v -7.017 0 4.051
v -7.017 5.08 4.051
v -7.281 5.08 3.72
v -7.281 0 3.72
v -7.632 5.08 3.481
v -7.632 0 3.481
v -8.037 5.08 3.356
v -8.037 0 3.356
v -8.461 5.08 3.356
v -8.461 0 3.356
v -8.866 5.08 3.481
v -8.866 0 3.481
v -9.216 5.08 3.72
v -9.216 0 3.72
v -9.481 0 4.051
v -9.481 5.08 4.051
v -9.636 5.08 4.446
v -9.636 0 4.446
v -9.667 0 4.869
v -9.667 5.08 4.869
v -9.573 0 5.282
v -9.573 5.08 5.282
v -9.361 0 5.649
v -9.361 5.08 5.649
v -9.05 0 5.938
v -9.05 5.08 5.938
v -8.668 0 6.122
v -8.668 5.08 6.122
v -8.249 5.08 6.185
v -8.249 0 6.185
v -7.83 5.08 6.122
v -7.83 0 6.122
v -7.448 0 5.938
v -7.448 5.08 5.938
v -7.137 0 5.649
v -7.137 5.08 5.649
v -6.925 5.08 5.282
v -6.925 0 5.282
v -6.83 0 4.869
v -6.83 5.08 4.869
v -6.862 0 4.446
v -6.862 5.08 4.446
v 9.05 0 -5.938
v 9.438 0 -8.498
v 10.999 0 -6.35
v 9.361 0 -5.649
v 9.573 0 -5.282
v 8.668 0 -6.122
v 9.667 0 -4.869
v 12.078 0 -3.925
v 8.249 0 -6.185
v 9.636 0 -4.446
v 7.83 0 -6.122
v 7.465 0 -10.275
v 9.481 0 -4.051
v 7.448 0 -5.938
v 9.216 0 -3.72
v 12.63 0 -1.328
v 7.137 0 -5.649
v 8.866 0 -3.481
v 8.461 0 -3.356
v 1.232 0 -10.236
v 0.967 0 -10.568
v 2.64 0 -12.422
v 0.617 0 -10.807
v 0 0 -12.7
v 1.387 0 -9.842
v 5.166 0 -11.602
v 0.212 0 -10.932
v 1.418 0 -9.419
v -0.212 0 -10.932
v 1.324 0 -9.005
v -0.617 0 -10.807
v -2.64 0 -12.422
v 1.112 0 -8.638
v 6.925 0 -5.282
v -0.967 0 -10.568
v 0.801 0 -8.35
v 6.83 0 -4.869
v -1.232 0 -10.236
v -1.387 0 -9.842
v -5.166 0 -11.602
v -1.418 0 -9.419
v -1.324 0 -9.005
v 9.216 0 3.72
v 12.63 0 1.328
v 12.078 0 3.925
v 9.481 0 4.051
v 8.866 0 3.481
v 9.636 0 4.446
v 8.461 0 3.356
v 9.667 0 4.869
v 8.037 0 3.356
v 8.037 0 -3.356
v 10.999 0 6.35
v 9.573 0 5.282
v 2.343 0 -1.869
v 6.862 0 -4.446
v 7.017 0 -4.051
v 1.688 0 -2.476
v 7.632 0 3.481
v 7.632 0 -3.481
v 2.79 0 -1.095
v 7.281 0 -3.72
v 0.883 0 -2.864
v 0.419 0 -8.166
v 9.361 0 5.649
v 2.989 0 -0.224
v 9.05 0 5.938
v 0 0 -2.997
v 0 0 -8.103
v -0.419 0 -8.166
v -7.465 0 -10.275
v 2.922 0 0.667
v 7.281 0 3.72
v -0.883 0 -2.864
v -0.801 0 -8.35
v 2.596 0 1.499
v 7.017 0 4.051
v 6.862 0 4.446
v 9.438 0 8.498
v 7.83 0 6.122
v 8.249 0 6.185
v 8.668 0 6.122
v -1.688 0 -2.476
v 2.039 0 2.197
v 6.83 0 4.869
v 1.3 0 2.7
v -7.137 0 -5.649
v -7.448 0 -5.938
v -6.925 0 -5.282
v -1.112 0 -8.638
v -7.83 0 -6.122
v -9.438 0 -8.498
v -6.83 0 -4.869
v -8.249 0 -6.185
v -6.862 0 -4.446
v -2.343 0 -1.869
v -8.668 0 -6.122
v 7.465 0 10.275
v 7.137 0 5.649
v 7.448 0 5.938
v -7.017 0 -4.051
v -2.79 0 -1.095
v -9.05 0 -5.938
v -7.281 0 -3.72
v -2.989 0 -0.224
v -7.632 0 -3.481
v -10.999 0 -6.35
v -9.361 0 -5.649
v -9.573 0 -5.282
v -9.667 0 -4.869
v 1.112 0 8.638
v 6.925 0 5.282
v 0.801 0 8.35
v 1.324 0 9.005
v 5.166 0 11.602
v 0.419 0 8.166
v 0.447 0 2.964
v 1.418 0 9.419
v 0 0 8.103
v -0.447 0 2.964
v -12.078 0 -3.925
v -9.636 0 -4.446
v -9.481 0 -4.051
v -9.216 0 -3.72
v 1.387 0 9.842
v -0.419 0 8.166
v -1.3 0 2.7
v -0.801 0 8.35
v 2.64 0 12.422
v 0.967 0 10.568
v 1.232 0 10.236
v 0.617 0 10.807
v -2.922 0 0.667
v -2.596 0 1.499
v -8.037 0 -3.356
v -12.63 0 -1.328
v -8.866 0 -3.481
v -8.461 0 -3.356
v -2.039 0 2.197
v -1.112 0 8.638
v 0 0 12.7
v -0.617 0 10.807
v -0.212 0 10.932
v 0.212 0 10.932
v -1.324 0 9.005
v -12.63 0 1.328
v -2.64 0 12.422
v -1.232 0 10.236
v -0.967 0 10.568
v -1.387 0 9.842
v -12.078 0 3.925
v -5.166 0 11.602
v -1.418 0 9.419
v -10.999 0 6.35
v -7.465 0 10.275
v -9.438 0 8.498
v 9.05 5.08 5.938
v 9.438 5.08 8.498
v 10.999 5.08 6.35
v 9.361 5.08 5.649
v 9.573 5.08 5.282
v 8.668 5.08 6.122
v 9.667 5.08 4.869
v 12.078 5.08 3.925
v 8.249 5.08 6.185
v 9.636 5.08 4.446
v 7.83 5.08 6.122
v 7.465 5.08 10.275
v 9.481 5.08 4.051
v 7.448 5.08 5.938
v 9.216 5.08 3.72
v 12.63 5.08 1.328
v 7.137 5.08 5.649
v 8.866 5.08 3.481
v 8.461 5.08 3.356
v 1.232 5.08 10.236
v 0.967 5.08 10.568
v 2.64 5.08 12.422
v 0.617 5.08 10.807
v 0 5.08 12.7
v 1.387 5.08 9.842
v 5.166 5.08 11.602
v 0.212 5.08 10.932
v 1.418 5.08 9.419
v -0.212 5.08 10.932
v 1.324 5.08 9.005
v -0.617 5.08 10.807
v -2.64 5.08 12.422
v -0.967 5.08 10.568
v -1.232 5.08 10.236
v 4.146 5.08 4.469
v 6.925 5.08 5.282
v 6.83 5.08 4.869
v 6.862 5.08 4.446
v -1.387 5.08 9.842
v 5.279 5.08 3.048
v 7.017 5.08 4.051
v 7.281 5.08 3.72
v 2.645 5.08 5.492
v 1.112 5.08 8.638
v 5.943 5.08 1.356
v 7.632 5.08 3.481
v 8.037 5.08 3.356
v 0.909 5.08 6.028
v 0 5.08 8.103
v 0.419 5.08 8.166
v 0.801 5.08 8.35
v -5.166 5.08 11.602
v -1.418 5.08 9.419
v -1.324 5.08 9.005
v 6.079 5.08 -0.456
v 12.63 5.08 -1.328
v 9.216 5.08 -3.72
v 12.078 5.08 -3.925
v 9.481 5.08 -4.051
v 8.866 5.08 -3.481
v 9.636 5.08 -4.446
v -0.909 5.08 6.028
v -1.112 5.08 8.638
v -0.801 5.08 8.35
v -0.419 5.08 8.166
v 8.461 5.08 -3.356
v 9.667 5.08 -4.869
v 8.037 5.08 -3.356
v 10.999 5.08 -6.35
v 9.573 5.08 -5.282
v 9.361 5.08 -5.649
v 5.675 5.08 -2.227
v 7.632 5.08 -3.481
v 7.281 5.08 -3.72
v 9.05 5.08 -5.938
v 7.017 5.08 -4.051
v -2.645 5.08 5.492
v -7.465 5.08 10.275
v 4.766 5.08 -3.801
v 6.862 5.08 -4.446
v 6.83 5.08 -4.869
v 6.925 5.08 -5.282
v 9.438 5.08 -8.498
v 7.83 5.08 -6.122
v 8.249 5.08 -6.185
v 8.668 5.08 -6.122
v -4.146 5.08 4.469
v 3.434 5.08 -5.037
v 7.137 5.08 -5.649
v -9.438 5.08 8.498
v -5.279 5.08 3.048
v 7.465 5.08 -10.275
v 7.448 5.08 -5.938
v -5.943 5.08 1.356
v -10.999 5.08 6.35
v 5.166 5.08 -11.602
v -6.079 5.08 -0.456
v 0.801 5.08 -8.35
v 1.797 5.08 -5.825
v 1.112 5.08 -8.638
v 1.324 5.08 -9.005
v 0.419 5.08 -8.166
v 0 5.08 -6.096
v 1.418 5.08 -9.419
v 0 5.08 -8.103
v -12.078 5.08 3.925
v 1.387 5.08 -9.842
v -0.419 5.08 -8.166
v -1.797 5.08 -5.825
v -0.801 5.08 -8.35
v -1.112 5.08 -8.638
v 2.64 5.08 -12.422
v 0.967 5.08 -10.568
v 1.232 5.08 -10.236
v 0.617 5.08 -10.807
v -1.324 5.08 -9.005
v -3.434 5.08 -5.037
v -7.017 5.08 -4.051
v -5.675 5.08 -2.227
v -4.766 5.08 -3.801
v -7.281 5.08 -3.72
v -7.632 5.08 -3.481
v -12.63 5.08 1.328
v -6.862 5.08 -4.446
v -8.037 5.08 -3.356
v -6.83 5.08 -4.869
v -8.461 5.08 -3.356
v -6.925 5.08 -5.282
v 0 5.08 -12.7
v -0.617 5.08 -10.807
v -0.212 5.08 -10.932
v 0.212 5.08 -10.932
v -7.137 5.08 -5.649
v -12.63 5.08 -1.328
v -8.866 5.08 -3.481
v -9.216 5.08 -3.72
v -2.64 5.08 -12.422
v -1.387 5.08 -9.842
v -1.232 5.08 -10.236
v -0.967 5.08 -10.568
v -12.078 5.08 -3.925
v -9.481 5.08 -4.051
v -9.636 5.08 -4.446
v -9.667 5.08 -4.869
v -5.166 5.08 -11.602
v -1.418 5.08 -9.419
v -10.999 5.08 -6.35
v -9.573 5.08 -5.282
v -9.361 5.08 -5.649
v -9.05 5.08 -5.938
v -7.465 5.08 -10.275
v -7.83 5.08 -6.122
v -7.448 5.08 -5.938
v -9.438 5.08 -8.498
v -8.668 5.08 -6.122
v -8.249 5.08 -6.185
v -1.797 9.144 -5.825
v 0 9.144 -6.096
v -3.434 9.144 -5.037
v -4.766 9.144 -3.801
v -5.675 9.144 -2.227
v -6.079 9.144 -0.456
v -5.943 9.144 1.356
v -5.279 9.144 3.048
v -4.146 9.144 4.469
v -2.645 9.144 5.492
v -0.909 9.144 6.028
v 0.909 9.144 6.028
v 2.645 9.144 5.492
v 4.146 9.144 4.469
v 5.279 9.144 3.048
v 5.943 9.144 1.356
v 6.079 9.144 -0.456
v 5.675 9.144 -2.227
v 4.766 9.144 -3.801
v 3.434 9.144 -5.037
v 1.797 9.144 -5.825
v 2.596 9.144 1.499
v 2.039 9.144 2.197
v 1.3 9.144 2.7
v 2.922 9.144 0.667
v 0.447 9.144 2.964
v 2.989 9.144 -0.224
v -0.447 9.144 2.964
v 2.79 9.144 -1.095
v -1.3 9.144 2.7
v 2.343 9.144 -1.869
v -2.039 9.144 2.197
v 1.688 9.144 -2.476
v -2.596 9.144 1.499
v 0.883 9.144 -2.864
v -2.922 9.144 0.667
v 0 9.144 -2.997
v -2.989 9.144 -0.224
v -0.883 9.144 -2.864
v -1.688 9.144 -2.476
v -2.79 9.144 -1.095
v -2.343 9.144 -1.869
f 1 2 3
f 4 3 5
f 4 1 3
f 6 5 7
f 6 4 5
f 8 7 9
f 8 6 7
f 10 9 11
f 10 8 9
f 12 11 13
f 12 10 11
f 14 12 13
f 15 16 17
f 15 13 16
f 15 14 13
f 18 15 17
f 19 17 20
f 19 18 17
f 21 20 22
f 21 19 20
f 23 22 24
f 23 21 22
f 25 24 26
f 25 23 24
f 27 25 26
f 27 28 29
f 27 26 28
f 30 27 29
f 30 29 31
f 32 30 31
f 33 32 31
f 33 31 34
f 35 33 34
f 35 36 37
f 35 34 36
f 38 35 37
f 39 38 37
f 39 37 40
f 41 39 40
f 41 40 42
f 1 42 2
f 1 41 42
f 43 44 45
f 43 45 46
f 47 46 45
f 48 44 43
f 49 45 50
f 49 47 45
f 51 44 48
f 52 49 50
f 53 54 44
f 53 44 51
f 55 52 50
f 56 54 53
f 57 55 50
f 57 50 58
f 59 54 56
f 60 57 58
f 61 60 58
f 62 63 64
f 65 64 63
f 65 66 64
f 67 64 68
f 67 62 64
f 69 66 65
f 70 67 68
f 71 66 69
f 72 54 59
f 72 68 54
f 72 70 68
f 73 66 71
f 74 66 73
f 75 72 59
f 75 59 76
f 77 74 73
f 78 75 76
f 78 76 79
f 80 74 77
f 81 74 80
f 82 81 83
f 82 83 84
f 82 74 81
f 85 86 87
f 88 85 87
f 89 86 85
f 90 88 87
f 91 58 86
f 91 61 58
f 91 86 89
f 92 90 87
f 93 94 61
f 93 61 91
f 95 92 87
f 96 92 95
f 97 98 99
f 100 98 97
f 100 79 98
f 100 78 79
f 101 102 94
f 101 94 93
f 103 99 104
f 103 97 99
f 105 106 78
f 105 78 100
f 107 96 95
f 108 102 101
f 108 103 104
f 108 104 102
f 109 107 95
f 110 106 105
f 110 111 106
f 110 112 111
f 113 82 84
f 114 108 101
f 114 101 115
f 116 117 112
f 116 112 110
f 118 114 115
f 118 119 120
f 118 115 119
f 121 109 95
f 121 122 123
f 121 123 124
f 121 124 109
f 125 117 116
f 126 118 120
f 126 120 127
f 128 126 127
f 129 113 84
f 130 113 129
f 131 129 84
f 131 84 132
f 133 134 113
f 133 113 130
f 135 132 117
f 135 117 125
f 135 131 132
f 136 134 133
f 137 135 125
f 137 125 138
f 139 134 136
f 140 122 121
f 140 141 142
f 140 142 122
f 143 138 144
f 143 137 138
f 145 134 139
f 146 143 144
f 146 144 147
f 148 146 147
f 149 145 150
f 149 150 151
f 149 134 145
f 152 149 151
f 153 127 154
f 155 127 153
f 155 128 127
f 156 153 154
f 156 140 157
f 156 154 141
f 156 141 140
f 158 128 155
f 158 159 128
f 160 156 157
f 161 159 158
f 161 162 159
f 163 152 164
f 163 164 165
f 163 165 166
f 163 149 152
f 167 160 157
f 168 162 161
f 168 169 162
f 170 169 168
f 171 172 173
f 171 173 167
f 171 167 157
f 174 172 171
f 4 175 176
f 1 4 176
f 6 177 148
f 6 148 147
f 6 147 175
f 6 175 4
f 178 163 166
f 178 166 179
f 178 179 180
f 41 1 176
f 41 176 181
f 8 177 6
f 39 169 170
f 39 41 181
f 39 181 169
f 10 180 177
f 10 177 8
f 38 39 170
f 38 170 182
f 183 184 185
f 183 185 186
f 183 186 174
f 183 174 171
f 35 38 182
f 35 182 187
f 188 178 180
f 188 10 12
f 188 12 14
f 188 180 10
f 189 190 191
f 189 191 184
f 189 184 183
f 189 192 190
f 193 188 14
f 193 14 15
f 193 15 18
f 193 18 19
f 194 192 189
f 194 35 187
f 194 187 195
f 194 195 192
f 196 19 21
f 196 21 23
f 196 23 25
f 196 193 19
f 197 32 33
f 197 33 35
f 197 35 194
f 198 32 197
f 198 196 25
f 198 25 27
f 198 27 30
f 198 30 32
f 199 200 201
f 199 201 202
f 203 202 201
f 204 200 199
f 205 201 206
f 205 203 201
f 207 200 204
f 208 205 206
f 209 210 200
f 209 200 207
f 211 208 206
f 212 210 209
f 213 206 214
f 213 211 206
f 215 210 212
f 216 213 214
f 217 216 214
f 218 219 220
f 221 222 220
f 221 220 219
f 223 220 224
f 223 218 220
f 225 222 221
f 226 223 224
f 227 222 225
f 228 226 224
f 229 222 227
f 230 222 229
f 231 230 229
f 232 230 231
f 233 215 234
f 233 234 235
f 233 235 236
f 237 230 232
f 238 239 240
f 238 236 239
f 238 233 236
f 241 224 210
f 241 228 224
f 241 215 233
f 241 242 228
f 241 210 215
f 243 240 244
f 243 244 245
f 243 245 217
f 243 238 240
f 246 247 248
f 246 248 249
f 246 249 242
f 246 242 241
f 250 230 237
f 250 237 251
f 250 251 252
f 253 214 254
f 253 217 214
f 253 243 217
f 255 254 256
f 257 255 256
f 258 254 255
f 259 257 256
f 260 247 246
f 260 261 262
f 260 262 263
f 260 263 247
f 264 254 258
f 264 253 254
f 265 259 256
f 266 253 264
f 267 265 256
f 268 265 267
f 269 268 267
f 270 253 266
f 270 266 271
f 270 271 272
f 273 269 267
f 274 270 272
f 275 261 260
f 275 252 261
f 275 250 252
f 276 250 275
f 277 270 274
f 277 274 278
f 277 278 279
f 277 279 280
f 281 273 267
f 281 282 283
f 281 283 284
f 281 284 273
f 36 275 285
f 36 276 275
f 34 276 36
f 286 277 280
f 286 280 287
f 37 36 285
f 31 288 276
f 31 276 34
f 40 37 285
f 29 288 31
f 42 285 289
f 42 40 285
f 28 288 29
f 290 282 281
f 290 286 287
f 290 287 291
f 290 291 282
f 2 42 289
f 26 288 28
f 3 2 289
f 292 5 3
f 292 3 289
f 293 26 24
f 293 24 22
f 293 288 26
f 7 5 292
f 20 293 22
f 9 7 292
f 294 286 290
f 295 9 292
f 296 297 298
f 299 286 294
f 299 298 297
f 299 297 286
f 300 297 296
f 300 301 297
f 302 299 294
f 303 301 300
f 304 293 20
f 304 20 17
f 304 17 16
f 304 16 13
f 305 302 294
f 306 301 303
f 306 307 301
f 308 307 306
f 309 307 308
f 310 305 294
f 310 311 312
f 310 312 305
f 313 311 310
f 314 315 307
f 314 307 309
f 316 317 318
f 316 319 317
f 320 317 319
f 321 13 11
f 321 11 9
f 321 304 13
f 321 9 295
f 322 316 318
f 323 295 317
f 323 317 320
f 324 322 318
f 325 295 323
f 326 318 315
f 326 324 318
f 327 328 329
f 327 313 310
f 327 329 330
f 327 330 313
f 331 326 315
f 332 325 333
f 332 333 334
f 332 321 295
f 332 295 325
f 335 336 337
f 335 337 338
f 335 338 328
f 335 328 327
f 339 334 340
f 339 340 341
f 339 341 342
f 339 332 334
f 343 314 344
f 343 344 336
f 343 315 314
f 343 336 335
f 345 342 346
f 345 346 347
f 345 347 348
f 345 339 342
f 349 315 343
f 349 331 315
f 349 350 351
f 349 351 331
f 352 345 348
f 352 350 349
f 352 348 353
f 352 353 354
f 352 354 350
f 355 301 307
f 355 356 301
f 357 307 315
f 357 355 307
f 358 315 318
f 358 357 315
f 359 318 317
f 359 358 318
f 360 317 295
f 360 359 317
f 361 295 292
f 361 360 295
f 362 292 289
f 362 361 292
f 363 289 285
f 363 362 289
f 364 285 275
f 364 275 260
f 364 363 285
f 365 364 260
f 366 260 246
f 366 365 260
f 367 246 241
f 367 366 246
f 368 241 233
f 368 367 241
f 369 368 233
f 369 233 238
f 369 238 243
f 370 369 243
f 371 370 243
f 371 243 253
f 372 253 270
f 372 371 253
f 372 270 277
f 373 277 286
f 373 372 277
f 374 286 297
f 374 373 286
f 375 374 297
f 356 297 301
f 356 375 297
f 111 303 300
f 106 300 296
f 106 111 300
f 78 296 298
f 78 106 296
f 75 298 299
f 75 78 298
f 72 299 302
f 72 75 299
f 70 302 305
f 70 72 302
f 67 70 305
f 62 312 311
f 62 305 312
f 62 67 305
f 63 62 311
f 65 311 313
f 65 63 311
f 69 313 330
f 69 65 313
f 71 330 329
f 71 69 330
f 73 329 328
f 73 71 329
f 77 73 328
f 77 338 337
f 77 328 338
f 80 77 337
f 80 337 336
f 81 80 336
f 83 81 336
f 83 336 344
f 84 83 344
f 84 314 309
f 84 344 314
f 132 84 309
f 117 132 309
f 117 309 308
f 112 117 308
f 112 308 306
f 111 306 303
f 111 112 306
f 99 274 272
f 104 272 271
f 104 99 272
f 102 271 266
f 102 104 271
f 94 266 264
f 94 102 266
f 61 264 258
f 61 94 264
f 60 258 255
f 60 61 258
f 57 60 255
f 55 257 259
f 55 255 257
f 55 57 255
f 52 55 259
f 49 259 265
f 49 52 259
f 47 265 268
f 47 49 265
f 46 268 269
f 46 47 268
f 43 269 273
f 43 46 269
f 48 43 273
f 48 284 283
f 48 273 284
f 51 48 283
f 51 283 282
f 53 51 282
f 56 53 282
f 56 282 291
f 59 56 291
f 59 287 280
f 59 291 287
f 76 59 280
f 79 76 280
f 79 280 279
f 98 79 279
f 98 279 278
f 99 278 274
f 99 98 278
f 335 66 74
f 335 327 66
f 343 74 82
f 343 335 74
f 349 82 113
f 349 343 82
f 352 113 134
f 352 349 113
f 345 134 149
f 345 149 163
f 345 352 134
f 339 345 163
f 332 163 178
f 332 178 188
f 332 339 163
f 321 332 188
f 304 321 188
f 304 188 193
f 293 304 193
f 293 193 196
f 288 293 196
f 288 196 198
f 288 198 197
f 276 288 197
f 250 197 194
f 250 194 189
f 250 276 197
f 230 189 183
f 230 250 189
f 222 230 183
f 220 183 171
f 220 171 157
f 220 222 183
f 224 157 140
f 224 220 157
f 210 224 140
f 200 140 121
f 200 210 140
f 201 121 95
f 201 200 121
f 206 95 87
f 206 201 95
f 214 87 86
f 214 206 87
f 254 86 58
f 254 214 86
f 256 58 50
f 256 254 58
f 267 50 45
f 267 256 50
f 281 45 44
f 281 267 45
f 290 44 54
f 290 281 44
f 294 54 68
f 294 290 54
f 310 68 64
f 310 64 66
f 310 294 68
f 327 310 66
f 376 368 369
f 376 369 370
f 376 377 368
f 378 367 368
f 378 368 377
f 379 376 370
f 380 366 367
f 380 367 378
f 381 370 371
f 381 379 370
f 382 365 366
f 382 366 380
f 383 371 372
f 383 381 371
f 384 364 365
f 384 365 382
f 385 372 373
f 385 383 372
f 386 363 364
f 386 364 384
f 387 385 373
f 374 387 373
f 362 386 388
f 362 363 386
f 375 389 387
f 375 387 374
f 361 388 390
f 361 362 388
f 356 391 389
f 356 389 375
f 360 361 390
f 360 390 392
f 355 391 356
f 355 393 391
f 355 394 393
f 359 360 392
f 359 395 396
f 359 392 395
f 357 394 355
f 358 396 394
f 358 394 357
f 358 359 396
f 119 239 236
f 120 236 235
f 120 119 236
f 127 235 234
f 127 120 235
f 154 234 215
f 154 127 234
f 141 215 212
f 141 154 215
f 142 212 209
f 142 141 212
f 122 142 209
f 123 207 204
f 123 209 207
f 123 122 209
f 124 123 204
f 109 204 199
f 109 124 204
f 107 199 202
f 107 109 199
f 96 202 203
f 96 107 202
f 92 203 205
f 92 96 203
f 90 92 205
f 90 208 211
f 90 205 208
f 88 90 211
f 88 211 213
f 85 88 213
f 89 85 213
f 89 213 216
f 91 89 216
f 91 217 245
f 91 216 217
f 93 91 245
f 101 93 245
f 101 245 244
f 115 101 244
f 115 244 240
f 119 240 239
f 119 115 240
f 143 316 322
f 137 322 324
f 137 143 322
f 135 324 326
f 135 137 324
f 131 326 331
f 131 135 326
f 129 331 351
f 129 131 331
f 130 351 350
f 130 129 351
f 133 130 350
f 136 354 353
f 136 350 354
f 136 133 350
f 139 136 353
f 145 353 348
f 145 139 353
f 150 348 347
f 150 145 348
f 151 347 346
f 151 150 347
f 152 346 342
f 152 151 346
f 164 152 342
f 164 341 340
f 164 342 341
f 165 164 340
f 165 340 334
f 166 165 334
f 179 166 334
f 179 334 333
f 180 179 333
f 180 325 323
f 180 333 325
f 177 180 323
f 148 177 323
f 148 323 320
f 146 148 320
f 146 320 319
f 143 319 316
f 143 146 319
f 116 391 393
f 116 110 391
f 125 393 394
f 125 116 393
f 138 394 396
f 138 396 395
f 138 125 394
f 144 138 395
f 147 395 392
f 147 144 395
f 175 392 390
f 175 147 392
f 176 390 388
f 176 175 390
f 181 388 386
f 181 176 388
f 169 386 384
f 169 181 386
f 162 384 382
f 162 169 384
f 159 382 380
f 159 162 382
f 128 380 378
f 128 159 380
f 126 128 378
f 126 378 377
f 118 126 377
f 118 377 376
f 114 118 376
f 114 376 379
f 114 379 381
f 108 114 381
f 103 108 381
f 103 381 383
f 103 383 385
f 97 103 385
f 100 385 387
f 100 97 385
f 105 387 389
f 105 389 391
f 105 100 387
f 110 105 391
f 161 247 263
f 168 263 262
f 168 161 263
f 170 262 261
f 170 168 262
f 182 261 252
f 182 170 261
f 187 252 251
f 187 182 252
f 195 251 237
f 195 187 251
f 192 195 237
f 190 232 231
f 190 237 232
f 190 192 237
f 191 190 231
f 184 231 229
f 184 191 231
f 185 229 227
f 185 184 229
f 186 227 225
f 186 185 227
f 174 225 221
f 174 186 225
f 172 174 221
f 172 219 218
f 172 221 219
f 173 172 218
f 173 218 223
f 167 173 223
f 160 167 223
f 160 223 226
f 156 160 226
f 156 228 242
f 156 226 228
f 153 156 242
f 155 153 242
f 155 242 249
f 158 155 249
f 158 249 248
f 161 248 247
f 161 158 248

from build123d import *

# Parameters (mm, degrees)
SKETCH2_R          = 1.4224
CUT_EXTRUDE1_DEPTH = 21.154223776
CIRPATTERN1_COUNT  = 6


with BuildPart() as part:
    # Sketch1 → Revolve1 (revolve)
    with BuildSketch(Plane.XY, mode=Mode.PRIVATE) as revolve1_sk:
        Polygon((2.9972, 0), (12.7, 0), (12.7, 5.08), (6.096, 5.08), (6.096, 9.144), (2.9972, 9.144), align=None)
    revolve(revolve1_sk.sketch.rotate(Axis((0, 0, 0), (0, 1, 0)), 90), axis=Axis((0, 0, 0), (0, 1, 0)))

    # Sketch2 → Cut-Extrude1 (cut, through all)
    with BuildSketch(Plane(origin=(0, 0, 0), x_dir=(1, 0, 0), z_dir=(0, 1, 0))):
        with Locations(Location((0, 9.525, 0), (0, 0, 270))):
            Circle(SKETCH2_R)
    cut_extrude1 = extrude(amount=CUT_EXTRUDE1_DEPTH, mode=Mode.SUBTRACT)

    # CirPattern1: Cut-Extrude1 ×6 about axis
    cirpattern1_axis = Axis((0, 0, 0), (0, 1, 0))
    for i in range(1, CIRPATTERN1_COUNT):
        add(cut_extrude1.rotate(cirpattern1_axis, i * 360 / CIRPATTERN1_COUNT), mode=Mode.SUBTRACT)


solid = part.part
